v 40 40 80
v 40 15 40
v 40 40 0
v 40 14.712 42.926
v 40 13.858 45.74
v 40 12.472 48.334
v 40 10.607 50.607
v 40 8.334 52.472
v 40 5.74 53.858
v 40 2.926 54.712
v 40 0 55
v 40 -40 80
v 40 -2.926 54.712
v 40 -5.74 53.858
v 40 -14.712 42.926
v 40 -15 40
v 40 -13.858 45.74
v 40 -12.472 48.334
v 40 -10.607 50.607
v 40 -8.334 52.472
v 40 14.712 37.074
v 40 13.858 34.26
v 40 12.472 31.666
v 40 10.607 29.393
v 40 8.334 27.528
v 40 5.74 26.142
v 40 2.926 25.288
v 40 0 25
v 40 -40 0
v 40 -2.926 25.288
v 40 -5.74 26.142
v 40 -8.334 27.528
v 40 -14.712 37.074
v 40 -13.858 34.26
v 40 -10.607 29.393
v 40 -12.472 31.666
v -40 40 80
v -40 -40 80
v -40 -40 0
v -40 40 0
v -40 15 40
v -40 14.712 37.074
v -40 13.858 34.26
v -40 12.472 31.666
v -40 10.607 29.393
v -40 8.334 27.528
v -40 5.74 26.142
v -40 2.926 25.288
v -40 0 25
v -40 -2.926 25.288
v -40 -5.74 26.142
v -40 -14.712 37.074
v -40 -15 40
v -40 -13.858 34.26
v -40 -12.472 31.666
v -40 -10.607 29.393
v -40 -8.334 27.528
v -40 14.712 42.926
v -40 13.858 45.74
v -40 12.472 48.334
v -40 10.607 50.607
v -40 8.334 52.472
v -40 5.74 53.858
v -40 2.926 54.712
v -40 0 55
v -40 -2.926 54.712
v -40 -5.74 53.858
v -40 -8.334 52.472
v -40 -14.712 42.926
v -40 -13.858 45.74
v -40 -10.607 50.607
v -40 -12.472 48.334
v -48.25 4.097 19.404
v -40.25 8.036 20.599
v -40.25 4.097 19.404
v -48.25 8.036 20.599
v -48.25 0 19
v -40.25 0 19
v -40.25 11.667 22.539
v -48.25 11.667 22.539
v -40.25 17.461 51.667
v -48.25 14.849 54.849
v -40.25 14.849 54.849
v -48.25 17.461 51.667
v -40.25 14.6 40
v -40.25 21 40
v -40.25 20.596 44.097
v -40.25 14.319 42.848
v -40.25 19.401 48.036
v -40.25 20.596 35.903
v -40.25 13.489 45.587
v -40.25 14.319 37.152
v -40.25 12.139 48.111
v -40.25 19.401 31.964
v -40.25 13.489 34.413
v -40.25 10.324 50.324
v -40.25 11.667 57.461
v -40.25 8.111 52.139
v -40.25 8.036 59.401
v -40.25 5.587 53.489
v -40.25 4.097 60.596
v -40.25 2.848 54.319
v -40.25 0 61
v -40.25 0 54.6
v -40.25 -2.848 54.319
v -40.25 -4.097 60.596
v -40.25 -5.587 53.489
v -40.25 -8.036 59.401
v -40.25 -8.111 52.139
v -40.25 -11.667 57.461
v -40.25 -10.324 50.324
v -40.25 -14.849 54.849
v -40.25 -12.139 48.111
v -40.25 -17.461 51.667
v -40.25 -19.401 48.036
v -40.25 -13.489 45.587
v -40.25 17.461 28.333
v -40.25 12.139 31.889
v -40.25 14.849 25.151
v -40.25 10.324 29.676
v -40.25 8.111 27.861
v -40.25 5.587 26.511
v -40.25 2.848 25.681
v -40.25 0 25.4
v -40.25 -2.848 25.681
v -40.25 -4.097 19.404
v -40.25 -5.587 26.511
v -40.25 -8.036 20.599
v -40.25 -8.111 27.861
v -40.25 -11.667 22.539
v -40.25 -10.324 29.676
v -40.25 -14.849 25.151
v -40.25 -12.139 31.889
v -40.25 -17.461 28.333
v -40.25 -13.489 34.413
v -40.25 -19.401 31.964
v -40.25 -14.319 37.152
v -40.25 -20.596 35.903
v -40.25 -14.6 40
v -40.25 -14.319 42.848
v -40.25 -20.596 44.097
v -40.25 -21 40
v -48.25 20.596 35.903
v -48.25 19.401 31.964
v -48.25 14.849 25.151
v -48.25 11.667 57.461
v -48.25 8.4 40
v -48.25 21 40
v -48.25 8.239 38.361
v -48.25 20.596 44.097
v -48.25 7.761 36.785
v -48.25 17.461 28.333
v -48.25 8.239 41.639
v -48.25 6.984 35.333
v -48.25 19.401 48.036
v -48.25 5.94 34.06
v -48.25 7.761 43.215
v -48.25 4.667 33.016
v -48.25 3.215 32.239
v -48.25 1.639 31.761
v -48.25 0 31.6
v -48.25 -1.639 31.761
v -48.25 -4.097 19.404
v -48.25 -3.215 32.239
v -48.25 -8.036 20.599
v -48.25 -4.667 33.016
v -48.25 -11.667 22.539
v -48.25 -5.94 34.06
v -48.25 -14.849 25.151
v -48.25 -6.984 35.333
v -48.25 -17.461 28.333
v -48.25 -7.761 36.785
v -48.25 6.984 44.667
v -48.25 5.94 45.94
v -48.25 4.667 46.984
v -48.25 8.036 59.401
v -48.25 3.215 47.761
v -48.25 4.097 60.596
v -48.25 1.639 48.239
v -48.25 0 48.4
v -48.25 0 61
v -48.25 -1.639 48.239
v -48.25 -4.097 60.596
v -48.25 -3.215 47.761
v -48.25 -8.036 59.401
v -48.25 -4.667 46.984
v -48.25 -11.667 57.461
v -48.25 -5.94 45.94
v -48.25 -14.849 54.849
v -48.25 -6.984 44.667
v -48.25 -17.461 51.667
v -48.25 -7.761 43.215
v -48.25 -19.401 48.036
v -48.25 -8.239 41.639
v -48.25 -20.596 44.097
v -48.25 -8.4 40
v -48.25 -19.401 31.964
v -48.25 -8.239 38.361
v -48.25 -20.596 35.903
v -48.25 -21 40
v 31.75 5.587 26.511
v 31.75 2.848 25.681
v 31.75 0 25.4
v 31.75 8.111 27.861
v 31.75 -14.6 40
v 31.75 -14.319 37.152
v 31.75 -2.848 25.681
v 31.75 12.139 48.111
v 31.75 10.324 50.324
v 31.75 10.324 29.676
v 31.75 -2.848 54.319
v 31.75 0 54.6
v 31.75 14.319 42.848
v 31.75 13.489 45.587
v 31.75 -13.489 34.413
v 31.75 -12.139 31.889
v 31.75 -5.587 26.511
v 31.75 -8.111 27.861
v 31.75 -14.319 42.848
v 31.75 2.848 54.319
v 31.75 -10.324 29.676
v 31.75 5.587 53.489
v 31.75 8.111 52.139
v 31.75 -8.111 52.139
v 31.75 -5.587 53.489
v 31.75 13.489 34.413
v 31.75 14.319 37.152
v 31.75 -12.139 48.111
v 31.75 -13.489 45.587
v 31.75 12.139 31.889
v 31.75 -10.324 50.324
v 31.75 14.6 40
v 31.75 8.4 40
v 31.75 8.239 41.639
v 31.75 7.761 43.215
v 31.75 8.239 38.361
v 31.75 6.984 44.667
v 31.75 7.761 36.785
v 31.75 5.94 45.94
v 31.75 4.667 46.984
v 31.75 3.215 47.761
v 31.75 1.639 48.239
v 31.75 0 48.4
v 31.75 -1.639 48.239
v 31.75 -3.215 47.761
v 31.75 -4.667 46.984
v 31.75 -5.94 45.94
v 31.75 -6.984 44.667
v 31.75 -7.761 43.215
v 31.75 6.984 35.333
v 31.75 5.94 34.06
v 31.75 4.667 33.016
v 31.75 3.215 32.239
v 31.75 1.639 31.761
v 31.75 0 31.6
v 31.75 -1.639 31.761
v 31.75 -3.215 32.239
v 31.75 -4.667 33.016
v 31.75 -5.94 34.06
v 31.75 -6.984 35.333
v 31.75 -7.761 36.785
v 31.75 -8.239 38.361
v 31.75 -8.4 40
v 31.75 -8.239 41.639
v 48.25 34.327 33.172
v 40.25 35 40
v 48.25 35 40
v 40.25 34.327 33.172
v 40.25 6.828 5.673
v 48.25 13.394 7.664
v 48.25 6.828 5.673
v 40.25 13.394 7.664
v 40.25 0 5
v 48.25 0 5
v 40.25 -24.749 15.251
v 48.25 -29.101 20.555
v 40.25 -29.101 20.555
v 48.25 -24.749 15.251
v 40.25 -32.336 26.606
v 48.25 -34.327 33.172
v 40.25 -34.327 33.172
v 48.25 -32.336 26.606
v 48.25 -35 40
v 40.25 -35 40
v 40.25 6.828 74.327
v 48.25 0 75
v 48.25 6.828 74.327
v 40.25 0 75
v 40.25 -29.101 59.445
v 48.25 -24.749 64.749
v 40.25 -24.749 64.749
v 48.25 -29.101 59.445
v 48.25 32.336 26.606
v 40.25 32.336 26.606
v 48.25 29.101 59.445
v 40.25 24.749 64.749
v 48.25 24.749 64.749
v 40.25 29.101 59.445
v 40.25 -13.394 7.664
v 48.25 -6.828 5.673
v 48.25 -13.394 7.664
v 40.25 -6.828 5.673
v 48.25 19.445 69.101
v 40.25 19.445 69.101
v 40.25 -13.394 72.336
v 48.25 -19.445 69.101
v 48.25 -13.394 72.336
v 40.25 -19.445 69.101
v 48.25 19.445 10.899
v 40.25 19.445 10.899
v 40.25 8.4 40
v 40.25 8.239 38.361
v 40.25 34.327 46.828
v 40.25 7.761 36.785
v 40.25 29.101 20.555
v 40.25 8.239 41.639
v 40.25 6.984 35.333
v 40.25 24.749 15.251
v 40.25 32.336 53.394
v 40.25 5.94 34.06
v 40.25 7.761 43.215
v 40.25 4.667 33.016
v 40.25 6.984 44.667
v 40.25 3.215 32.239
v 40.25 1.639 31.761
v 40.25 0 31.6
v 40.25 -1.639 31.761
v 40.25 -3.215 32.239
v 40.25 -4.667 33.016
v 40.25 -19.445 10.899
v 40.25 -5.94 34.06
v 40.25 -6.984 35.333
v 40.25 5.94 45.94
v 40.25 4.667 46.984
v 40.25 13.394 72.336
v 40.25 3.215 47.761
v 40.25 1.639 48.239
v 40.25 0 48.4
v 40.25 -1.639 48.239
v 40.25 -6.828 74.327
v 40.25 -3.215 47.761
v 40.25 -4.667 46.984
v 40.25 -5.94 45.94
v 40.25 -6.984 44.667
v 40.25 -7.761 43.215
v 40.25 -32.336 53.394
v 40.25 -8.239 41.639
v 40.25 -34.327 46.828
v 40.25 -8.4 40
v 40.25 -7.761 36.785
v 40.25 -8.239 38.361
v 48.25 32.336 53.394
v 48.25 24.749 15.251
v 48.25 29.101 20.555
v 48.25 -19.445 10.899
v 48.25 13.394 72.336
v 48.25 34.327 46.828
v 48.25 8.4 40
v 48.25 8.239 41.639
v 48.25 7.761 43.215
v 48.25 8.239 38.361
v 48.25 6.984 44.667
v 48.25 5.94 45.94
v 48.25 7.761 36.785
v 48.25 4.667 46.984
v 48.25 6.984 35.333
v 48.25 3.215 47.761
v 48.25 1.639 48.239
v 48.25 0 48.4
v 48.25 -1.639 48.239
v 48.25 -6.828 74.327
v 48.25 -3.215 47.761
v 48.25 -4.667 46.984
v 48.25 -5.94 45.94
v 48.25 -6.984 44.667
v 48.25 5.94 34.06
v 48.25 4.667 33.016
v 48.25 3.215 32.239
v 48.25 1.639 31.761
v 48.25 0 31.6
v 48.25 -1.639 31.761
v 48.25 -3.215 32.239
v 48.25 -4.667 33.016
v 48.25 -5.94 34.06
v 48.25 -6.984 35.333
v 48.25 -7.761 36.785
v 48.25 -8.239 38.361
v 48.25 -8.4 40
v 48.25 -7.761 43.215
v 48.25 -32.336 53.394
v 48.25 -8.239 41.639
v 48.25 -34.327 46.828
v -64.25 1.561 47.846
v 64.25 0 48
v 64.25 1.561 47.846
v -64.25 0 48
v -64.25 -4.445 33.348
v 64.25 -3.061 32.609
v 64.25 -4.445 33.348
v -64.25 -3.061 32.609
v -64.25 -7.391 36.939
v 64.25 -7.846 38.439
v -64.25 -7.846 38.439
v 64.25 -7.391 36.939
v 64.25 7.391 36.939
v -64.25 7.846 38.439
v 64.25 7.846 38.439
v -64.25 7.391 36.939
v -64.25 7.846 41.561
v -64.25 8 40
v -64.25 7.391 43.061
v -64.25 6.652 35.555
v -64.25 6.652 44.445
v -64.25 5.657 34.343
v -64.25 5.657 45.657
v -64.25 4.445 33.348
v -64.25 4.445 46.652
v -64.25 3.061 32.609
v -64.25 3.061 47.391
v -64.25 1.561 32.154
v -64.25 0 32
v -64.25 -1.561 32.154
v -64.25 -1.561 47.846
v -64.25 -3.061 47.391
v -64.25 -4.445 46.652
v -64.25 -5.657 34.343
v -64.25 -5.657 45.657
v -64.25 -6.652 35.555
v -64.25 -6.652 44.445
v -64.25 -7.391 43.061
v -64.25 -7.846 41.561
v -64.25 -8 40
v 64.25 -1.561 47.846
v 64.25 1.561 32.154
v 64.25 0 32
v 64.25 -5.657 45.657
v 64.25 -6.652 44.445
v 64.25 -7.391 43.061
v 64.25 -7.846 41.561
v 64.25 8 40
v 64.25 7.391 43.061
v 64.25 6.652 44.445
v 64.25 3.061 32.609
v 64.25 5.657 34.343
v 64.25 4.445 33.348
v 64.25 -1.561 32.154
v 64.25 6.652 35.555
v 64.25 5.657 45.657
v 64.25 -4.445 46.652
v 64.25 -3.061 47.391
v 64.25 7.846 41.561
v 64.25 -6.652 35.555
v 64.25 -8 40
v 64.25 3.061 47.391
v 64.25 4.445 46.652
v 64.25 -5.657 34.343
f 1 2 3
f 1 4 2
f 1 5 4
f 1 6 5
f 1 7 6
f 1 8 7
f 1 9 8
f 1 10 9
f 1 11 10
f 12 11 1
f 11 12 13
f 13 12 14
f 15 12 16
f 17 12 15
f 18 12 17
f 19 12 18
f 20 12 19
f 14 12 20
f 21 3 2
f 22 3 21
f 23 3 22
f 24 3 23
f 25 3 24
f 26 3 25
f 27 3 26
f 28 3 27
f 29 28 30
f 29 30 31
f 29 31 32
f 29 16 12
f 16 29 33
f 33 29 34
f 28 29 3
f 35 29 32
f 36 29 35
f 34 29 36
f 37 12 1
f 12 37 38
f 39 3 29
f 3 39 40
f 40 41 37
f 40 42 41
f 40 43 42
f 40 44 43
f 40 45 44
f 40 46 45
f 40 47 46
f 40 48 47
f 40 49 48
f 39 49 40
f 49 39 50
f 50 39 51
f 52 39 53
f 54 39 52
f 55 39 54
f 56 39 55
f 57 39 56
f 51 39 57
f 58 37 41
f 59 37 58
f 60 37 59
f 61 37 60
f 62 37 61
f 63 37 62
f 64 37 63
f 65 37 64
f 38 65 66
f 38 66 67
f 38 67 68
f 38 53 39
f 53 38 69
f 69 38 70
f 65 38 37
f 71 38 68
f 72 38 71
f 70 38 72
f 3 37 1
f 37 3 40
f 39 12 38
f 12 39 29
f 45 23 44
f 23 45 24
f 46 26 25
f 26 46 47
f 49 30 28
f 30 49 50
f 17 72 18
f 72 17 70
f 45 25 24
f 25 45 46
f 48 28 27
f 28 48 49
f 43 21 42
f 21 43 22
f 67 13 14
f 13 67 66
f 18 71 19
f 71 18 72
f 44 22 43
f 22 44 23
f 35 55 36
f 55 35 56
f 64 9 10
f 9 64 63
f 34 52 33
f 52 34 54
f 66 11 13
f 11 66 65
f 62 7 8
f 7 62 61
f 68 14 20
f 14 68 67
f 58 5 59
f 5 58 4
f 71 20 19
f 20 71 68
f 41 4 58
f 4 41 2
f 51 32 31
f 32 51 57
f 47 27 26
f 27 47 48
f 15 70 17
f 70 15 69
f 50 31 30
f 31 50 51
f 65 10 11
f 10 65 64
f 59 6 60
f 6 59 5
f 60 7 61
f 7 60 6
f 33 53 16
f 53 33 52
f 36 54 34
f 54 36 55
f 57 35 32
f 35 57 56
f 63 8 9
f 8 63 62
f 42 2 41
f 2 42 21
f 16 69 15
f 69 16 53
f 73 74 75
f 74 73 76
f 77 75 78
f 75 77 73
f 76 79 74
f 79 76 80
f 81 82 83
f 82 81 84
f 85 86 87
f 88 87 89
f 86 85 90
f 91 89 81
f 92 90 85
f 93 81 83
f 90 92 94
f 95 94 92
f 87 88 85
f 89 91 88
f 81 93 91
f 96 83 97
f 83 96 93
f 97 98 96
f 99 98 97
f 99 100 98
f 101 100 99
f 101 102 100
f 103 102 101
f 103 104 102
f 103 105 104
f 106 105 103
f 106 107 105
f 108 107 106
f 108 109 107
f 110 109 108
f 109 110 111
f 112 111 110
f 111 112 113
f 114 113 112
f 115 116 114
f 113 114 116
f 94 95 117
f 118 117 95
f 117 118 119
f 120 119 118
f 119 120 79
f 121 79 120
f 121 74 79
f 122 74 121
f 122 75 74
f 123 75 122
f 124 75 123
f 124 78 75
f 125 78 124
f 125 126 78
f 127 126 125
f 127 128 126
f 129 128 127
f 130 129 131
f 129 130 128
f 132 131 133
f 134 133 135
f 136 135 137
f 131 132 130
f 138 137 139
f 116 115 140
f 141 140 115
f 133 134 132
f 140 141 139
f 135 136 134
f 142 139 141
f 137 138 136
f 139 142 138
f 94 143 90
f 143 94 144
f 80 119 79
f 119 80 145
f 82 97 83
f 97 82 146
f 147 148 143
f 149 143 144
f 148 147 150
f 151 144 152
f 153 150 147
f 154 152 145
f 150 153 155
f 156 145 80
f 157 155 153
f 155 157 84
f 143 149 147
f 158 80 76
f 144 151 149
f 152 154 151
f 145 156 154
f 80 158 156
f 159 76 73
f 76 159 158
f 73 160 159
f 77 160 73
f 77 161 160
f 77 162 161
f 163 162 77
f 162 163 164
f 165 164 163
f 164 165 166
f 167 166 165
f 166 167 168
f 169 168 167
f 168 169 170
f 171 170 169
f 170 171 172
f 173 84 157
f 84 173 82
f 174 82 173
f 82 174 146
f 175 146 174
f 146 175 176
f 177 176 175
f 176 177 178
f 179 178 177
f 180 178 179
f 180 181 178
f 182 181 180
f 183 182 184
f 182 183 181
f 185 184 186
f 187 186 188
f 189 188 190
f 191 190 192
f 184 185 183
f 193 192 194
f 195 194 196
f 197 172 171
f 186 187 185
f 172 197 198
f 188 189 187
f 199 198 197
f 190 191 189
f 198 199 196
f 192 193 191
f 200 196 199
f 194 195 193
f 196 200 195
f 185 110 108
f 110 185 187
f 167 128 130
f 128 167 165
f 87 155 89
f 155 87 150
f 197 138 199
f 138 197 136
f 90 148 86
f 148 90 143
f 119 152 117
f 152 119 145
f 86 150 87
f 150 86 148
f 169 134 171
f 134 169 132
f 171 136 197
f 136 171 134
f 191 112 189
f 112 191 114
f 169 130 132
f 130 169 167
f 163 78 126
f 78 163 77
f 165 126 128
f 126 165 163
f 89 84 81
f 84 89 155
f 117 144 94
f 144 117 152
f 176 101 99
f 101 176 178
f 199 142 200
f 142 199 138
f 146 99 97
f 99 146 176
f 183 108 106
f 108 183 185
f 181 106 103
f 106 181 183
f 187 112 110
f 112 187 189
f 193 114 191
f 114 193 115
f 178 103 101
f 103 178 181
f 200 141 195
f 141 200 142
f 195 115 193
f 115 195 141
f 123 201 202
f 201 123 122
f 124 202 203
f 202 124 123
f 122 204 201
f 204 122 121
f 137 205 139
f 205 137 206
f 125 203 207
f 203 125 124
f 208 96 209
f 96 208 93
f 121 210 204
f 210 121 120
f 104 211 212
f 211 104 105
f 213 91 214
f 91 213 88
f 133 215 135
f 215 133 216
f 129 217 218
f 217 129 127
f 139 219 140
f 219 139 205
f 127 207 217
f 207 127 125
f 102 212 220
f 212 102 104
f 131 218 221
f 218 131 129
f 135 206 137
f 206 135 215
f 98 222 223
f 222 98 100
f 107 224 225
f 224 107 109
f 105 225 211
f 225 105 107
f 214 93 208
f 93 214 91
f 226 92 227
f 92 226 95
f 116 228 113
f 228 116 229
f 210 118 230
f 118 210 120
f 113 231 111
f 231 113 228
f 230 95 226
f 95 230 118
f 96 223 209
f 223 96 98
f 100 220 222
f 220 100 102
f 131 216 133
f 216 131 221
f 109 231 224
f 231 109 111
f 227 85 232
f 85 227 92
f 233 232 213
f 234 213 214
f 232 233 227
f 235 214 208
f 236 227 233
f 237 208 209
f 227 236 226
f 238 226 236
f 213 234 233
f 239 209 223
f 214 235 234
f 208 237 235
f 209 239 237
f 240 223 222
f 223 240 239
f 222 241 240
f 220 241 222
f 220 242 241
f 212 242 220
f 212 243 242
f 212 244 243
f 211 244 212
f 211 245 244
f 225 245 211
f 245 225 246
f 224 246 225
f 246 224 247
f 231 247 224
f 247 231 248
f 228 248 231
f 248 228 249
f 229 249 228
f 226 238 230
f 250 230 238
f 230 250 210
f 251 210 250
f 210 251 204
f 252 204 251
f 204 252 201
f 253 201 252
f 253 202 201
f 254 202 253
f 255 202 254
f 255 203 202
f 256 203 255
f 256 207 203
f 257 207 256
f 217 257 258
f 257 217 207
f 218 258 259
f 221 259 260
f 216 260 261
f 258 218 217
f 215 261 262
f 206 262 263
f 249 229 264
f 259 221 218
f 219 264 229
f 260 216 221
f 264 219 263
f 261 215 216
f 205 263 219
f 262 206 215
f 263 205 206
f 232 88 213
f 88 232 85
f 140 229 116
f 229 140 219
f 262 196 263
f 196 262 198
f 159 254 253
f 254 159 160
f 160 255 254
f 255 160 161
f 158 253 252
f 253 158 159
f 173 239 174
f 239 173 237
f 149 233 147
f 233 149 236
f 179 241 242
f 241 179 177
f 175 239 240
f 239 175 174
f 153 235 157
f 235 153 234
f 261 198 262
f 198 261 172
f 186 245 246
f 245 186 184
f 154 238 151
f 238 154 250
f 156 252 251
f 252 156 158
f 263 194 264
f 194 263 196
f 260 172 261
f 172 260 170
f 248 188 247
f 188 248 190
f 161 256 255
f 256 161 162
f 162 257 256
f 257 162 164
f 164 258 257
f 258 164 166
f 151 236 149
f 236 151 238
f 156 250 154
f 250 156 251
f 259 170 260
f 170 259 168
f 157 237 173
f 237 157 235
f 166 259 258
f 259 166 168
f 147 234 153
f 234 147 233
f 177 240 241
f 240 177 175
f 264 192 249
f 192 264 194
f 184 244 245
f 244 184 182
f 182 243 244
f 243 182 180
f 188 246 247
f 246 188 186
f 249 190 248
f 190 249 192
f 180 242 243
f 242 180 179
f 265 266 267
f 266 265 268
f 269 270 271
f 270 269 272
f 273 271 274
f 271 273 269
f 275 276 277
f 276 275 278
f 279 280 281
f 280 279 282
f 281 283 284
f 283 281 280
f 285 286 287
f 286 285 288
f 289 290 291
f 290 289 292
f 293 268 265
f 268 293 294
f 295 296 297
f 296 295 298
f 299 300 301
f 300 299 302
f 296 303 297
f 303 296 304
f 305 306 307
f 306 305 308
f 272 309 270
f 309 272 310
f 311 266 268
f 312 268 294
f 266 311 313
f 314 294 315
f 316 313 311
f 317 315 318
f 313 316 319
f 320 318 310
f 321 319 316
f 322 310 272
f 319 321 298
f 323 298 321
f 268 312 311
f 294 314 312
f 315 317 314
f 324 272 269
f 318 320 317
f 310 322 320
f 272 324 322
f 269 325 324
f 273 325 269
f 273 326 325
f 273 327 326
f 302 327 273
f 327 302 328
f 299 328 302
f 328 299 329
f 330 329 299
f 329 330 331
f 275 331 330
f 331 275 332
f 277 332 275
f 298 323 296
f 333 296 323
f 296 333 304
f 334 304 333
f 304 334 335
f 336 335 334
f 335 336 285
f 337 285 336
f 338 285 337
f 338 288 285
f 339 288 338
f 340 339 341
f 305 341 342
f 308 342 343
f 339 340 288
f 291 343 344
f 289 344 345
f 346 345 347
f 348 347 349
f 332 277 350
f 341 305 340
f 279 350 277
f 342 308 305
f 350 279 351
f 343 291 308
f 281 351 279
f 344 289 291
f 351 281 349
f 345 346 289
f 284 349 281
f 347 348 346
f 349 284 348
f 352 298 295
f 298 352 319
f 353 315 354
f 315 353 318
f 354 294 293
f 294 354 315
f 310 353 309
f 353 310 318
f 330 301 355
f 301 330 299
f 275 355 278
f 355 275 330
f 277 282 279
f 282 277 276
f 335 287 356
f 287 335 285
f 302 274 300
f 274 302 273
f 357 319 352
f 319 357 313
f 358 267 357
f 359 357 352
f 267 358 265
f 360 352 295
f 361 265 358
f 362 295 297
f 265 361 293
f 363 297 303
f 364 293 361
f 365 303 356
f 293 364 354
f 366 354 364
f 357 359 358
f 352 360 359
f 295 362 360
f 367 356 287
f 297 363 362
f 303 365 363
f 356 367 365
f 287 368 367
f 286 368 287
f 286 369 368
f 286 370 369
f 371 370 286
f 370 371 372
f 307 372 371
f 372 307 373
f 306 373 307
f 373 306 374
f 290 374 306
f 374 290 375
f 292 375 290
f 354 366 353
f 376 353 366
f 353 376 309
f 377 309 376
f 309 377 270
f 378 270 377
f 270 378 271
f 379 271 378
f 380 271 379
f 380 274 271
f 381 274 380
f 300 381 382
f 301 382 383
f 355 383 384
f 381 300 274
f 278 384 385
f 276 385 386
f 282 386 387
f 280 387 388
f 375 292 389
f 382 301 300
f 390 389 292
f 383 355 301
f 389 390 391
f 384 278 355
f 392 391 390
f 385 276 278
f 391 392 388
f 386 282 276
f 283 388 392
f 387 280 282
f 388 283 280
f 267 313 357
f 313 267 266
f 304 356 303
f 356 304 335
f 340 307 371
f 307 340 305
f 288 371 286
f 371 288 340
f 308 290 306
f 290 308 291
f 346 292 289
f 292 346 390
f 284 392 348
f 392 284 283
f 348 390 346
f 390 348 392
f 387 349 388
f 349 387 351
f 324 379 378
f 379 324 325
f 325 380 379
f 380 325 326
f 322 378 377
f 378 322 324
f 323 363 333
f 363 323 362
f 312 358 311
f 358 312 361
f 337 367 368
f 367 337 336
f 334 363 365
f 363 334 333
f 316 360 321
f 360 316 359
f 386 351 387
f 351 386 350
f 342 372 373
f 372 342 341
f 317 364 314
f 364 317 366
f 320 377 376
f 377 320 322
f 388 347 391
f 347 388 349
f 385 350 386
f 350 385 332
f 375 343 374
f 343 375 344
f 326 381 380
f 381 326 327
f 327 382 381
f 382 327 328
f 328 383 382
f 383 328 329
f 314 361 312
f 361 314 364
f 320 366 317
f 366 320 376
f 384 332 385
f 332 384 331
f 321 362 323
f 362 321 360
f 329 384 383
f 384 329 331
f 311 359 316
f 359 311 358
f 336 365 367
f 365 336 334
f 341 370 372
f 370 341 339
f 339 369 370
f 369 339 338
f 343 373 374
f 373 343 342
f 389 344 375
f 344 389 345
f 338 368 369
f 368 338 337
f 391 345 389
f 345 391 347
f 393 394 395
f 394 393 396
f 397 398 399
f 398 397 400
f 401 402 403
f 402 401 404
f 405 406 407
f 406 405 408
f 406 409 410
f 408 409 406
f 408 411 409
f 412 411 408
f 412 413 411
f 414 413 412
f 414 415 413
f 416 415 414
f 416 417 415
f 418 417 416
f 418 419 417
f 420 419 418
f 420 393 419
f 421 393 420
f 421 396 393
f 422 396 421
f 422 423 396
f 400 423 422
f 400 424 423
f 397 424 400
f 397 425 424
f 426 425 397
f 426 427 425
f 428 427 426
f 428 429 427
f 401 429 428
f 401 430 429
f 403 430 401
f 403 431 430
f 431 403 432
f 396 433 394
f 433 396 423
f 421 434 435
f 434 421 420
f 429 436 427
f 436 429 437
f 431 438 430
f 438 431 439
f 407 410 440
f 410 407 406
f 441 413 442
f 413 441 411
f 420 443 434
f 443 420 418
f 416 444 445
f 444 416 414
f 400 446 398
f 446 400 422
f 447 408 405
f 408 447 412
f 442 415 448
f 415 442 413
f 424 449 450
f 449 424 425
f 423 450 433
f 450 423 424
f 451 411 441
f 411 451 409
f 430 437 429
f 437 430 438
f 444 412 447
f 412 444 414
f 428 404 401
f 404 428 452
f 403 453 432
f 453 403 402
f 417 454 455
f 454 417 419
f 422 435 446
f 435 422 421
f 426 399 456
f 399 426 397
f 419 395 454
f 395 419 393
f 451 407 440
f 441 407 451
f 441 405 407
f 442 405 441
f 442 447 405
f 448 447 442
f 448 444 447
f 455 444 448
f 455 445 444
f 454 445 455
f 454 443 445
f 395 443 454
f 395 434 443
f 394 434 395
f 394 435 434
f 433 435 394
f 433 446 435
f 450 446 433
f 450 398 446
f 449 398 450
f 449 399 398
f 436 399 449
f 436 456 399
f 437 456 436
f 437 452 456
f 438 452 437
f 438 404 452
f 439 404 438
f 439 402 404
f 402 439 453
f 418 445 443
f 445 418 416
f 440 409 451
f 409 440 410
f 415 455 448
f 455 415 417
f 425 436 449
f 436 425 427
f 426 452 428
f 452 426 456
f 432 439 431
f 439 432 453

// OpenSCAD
$fn = 32;

// ------------------------------------------------------------------------
// Bushed housing: 80 x 80 x 80 mm housing, bushing d29.2
// Every part is its own module, assembly() places them once.
// ------------------------------------------------------------------------

// --- part 1 ---
module housing() {
  difference() {
    translate([-40, -40, 0]) cube([80, 80, 80]);
    translate([0, 0, 40]) rotate([0, 90, 0]) cylinder(h = 82, d = 30, center = true);
  }
}

// --- part 2 ---
module bushing() {
  difference() {
    union() {
      cylinder(h = 8, d = 42);
      translate([0, 0, 8]) cylinder(h = 72, d = 29.2);
    }
    translate([0, 0, -1]) cylinder(h = 82, d = 16.8);
  }
}

// --- part 3 ---
module shaft() {
  translate([0, 0, -64.25]) cylinder(h = 128.5, d = 16);
}

// --- part 4 ---
module cover() {
  difference() {
    cylinder(h = 8, d = 70);
    translate([0, 0, -1]) cylinder(h = 10, d = 16.8);
  }
}

// --- assembly ---
module assembly() {
  translate([0, 0, 0]) rotate([0, 0, 0]) housing();
  translate([-48.25, 0, 40]) rotate([0, 90, 0]) bushing();
  translate([0, 0, 40]) rotate([0, 90, 0]) shaft();
  translate([40.25, 0, 40]) rotate([0, 90, 0]) cover();
}

assembly();
